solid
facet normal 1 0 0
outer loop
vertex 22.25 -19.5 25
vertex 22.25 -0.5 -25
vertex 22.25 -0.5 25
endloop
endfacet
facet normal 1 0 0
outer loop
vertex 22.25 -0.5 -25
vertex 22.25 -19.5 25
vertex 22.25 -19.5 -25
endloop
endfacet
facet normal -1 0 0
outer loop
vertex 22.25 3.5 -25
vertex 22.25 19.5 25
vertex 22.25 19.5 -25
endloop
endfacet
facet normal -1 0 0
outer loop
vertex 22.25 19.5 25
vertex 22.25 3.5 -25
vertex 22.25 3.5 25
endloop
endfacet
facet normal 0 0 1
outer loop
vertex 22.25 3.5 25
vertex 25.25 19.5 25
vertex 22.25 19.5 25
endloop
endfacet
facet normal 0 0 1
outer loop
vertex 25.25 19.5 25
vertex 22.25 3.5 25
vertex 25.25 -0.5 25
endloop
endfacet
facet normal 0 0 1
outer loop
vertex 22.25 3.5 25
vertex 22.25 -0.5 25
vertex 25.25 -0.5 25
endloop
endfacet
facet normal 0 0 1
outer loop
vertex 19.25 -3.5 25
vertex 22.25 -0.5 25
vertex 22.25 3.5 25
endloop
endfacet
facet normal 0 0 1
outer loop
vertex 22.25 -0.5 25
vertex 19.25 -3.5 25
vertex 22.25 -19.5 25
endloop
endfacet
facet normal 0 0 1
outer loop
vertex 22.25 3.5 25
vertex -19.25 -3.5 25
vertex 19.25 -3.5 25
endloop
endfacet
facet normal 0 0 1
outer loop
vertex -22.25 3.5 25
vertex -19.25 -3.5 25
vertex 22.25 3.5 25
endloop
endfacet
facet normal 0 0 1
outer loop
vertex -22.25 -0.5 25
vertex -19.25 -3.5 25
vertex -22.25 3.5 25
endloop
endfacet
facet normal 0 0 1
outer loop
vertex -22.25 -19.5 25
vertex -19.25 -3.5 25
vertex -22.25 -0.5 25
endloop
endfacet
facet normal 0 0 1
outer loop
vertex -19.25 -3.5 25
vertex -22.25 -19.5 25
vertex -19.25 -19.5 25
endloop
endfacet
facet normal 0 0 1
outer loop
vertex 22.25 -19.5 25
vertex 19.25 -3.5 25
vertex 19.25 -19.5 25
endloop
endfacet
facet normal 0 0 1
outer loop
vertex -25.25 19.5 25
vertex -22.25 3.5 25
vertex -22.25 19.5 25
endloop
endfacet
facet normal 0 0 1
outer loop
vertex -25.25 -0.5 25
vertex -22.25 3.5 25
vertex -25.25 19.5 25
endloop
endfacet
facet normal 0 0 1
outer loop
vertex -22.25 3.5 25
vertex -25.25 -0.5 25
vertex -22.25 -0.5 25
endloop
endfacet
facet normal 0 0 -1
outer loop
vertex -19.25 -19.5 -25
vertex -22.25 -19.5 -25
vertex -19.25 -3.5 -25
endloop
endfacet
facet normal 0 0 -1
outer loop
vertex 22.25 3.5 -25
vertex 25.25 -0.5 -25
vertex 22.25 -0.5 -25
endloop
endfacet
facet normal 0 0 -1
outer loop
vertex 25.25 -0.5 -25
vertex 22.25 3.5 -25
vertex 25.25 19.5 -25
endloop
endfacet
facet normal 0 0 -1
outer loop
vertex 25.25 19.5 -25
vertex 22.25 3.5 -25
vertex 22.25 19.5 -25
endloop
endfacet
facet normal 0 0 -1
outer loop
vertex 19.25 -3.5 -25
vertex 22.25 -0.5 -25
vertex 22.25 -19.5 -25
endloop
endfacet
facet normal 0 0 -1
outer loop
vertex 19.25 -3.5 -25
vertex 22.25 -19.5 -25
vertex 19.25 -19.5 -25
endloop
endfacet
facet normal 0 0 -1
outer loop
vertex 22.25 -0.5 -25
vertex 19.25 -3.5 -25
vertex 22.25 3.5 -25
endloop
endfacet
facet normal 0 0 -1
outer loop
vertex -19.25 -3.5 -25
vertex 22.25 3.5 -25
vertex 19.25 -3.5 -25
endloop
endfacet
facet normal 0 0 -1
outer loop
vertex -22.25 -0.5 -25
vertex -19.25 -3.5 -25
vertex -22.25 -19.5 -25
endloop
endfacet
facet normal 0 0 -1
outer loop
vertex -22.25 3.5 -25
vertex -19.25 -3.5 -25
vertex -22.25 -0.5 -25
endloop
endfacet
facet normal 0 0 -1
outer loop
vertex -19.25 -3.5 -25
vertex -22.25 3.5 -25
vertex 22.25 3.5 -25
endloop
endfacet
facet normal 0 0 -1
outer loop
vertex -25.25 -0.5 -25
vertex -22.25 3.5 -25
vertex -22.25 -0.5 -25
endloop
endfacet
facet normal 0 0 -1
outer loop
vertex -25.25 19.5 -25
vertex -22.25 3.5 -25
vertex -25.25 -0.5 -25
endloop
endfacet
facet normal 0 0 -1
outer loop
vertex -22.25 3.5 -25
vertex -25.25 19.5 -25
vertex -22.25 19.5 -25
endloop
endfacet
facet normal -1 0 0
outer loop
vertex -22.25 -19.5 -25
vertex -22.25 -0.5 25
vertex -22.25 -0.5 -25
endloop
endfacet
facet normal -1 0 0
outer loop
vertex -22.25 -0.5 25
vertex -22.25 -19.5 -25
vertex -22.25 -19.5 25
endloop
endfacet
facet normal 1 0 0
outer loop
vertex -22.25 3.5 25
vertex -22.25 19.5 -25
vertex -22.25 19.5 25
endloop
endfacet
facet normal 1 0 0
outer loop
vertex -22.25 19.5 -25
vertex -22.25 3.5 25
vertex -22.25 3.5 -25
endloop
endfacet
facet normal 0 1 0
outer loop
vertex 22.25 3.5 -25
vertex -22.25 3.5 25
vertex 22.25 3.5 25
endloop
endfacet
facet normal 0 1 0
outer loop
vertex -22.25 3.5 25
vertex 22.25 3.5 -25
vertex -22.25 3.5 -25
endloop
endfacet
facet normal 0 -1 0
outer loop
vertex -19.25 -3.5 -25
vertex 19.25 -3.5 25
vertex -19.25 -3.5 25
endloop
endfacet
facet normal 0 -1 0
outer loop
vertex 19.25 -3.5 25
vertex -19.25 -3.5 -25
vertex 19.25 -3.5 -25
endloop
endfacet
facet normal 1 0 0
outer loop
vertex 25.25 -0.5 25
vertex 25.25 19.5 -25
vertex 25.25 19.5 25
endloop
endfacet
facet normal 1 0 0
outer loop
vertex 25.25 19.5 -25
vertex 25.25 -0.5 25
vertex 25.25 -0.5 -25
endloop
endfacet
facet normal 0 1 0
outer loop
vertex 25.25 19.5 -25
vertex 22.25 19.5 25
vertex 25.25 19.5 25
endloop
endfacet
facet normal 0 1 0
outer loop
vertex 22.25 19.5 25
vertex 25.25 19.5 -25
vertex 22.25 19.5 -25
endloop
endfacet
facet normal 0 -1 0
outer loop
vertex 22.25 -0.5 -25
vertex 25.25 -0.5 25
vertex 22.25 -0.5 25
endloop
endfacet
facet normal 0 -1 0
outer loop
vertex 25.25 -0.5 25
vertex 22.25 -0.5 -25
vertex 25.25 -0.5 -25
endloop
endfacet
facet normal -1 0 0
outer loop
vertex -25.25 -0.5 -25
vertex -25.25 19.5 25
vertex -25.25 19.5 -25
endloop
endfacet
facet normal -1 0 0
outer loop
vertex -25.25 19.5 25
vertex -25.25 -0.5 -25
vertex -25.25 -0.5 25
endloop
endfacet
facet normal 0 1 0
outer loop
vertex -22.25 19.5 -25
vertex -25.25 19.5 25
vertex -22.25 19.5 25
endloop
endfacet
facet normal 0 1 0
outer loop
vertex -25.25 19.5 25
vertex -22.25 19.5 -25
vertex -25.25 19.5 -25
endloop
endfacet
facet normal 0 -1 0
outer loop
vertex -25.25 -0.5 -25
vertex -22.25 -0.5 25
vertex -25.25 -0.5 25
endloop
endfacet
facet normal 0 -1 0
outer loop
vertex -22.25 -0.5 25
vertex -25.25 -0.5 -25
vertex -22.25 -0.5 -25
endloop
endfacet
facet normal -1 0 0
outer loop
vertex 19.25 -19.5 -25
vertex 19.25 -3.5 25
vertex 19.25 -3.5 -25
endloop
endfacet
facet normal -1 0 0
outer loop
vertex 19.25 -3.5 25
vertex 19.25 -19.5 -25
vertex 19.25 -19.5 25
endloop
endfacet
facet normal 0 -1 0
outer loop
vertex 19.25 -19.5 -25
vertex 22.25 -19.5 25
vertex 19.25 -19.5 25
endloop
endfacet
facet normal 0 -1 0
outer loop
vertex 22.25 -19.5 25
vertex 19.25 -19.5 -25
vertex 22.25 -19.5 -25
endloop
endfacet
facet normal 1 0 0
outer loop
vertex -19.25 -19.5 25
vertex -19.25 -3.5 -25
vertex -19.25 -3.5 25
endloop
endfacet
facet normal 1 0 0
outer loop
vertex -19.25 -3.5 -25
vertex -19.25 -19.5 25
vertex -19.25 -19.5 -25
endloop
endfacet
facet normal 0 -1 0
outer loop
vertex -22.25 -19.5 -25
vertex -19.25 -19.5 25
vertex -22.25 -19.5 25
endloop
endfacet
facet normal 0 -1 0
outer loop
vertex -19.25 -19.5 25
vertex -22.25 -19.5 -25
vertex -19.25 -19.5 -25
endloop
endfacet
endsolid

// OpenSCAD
camera_length=44.5;
mount_length=44.5;
displacemnent_height=7;
wall_thickness=3;
wall_height=50;
overhang_length=20;


union() {
    lengh_of_connection_to_base=4; // this might have to be adjusted if the edges are to long
    ends_of_bar=camera_length/2+wall_thickness/2;
    ends_of_base=mount_length/2+wall_thickness/2-3;
    y_of_ends=overhang_length/2+displacemnent_height/2-lengh_of_connection_to_base;
cube([camera_length,displacemnent_height,wall_height],center=true);
translate([ends_of_bar,y_of_ends,0])  cube([wall_thickness,overhang_length,wall_height],center=true);
translate([-ends_of_bar,y_of_ends,0])  cube([wall_thickness,overhang_length,wall_height],center=true);
    translate([ends_of_base,-y_of_ends,0])  cube([wall_thickness,overhang_length,wall_height],center=true);
translate([-ends_of_base,-y_of_ends,0])  cube([wall_thickness,overhang_length,wall_height],center=true);

}
